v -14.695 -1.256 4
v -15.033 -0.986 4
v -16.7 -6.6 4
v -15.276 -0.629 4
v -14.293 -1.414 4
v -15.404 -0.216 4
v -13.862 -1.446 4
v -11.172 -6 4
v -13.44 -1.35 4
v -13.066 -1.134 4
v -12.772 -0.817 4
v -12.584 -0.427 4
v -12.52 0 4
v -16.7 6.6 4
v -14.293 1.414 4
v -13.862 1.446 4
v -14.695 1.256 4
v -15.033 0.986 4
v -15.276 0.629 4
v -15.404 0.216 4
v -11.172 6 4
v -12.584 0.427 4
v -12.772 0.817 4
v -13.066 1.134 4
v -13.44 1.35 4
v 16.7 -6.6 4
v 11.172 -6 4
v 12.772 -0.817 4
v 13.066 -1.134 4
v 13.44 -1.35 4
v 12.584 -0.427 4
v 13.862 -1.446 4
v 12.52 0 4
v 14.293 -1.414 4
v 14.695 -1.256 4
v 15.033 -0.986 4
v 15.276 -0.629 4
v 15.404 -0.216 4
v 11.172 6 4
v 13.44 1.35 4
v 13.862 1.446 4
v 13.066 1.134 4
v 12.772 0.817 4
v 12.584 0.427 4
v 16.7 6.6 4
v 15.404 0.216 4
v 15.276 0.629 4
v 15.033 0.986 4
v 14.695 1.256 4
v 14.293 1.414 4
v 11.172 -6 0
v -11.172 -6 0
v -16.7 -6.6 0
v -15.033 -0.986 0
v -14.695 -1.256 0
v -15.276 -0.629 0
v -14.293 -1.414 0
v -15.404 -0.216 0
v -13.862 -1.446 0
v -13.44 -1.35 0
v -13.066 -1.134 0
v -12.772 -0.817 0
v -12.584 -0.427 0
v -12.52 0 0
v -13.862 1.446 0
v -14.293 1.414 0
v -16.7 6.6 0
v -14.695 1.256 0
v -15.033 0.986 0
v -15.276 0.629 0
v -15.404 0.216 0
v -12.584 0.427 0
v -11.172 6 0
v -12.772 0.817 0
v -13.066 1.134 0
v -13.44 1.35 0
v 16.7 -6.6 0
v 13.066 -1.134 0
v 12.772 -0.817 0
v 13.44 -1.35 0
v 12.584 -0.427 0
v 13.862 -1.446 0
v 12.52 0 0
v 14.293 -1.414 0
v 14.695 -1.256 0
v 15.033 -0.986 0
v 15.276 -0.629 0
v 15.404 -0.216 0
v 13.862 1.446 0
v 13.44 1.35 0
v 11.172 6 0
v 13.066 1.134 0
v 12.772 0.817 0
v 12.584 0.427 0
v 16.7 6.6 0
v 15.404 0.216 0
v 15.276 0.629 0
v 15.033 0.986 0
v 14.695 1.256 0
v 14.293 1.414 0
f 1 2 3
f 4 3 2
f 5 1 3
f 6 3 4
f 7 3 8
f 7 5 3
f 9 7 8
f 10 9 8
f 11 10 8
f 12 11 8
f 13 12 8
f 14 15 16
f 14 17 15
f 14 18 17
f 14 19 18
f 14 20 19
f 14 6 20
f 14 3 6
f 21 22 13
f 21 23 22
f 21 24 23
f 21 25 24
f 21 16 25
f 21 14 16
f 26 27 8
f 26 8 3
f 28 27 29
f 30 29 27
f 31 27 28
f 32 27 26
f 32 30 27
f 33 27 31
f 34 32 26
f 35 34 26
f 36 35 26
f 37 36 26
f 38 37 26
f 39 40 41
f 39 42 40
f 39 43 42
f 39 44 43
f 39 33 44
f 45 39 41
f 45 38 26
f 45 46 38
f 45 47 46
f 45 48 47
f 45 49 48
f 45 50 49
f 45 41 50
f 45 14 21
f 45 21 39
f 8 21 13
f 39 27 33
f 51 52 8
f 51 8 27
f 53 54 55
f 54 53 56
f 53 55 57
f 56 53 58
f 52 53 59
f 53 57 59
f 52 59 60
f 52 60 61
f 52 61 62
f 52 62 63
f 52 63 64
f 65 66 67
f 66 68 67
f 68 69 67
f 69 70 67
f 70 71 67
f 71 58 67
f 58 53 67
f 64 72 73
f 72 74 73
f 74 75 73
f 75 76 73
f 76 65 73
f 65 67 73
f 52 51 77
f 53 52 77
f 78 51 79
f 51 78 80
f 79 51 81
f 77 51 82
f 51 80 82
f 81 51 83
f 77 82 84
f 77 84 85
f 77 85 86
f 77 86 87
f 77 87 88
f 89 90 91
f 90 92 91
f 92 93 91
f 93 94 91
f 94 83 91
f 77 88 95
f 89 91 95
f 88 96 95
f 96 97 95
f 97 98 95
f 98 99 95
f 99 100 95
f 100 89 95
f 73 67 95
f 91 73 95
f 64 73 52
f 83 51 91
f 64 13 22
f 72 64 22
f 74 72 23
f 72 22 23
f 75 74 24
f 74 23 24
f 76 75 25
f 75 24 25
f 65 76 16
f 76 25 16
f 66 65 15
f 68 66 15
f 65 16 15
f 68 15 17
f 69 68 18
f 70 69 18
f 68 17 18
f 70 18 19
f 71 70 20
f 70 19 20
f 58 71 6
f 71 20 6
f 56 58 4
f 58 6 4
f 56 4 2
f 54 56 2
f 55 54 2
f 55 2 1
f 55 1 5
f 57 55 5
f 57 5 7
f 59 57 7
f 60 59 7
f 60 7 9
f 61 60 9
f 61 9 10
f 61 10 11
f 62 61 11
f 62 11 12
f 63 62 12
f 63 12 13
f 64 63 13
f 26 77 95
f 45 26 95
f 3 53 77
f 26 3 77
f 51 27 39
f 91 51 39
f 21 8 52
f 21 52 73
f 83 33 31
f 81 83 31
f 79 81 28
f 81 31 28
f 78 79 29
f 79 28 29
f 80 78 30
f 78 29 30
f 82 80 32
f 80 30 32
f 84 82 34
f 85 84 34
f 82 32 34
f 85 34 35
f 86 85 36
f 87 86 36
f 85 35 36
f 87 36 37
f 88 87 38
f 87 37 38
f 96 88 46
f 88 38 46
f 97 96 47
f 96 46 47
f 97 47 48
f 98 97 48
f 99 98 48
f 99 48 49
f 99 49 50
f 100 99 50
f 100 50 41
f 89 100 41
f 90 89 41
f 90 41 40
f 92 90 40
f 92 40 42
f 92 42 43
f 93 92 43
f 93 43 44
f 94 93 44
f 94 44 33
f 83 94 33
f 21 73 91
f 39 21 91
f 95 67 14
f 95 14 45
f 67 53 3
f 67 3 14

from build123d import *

# Parameters (mm, degrees)
SKETCH1_W            = 33.4
SKETCH1_H            = 13.2
SKETCH1_W_2          = 32.2
SKETCH1_H_2          = 12
BOSS_EXTRUDE3_DEPTH  = 4
SKETCH3_W            = 4.9276
SKETCH3_H            = 12
BOSS_EXTRUDE4_DEPTH  = 4
SKETCH4_R            = 1.45
MOUNTING_HOLES_DEPTH = 19.397010627


with BuildPart() as part:
    # Sketch1 → Boss-Extrude3 (new body)
    with BuildSketch(Plane.XY):
        Rectangle(SKETCH1_W, SKETCH1_H)
        Rectangle(SKETCH1_W_2, SKETCH1_H_2, mode=Mode.SUBTRACT)
    extrude(amount=BOSS_EXTRUDE3_DEPTH)

    # Sketch3 → Boss-Extrude4 (add, through all)
    with BuildSketch(Plane.XY.offset(4)):
        with Locations((-13.6362, 0)):
            Rectangle(SKETCH3_W, SKETCH3_H)
        with Locations((13.6362, 0)):
            Rectangle(SKETCH3_W, SKETCH3_H)
    extrude(amount=-BOSS_EXTRUDE4_DEPTH)

    # Sketch4 → mounting holes (cut, through all)
    with BuildSketch(Plane.XY.offset(4)):
        with Locations((-13.97, 0)):
            Circle(SKETCH4_R)
        with Locations(Location((13.97, 0, 0), (0, 0, 180))):
            Circle(SKETCH4_R)
    extrude(amount=-MOUNTING_HOLES_DEPTH, mode=Mode.SUBTRACT)


solid = part.part
